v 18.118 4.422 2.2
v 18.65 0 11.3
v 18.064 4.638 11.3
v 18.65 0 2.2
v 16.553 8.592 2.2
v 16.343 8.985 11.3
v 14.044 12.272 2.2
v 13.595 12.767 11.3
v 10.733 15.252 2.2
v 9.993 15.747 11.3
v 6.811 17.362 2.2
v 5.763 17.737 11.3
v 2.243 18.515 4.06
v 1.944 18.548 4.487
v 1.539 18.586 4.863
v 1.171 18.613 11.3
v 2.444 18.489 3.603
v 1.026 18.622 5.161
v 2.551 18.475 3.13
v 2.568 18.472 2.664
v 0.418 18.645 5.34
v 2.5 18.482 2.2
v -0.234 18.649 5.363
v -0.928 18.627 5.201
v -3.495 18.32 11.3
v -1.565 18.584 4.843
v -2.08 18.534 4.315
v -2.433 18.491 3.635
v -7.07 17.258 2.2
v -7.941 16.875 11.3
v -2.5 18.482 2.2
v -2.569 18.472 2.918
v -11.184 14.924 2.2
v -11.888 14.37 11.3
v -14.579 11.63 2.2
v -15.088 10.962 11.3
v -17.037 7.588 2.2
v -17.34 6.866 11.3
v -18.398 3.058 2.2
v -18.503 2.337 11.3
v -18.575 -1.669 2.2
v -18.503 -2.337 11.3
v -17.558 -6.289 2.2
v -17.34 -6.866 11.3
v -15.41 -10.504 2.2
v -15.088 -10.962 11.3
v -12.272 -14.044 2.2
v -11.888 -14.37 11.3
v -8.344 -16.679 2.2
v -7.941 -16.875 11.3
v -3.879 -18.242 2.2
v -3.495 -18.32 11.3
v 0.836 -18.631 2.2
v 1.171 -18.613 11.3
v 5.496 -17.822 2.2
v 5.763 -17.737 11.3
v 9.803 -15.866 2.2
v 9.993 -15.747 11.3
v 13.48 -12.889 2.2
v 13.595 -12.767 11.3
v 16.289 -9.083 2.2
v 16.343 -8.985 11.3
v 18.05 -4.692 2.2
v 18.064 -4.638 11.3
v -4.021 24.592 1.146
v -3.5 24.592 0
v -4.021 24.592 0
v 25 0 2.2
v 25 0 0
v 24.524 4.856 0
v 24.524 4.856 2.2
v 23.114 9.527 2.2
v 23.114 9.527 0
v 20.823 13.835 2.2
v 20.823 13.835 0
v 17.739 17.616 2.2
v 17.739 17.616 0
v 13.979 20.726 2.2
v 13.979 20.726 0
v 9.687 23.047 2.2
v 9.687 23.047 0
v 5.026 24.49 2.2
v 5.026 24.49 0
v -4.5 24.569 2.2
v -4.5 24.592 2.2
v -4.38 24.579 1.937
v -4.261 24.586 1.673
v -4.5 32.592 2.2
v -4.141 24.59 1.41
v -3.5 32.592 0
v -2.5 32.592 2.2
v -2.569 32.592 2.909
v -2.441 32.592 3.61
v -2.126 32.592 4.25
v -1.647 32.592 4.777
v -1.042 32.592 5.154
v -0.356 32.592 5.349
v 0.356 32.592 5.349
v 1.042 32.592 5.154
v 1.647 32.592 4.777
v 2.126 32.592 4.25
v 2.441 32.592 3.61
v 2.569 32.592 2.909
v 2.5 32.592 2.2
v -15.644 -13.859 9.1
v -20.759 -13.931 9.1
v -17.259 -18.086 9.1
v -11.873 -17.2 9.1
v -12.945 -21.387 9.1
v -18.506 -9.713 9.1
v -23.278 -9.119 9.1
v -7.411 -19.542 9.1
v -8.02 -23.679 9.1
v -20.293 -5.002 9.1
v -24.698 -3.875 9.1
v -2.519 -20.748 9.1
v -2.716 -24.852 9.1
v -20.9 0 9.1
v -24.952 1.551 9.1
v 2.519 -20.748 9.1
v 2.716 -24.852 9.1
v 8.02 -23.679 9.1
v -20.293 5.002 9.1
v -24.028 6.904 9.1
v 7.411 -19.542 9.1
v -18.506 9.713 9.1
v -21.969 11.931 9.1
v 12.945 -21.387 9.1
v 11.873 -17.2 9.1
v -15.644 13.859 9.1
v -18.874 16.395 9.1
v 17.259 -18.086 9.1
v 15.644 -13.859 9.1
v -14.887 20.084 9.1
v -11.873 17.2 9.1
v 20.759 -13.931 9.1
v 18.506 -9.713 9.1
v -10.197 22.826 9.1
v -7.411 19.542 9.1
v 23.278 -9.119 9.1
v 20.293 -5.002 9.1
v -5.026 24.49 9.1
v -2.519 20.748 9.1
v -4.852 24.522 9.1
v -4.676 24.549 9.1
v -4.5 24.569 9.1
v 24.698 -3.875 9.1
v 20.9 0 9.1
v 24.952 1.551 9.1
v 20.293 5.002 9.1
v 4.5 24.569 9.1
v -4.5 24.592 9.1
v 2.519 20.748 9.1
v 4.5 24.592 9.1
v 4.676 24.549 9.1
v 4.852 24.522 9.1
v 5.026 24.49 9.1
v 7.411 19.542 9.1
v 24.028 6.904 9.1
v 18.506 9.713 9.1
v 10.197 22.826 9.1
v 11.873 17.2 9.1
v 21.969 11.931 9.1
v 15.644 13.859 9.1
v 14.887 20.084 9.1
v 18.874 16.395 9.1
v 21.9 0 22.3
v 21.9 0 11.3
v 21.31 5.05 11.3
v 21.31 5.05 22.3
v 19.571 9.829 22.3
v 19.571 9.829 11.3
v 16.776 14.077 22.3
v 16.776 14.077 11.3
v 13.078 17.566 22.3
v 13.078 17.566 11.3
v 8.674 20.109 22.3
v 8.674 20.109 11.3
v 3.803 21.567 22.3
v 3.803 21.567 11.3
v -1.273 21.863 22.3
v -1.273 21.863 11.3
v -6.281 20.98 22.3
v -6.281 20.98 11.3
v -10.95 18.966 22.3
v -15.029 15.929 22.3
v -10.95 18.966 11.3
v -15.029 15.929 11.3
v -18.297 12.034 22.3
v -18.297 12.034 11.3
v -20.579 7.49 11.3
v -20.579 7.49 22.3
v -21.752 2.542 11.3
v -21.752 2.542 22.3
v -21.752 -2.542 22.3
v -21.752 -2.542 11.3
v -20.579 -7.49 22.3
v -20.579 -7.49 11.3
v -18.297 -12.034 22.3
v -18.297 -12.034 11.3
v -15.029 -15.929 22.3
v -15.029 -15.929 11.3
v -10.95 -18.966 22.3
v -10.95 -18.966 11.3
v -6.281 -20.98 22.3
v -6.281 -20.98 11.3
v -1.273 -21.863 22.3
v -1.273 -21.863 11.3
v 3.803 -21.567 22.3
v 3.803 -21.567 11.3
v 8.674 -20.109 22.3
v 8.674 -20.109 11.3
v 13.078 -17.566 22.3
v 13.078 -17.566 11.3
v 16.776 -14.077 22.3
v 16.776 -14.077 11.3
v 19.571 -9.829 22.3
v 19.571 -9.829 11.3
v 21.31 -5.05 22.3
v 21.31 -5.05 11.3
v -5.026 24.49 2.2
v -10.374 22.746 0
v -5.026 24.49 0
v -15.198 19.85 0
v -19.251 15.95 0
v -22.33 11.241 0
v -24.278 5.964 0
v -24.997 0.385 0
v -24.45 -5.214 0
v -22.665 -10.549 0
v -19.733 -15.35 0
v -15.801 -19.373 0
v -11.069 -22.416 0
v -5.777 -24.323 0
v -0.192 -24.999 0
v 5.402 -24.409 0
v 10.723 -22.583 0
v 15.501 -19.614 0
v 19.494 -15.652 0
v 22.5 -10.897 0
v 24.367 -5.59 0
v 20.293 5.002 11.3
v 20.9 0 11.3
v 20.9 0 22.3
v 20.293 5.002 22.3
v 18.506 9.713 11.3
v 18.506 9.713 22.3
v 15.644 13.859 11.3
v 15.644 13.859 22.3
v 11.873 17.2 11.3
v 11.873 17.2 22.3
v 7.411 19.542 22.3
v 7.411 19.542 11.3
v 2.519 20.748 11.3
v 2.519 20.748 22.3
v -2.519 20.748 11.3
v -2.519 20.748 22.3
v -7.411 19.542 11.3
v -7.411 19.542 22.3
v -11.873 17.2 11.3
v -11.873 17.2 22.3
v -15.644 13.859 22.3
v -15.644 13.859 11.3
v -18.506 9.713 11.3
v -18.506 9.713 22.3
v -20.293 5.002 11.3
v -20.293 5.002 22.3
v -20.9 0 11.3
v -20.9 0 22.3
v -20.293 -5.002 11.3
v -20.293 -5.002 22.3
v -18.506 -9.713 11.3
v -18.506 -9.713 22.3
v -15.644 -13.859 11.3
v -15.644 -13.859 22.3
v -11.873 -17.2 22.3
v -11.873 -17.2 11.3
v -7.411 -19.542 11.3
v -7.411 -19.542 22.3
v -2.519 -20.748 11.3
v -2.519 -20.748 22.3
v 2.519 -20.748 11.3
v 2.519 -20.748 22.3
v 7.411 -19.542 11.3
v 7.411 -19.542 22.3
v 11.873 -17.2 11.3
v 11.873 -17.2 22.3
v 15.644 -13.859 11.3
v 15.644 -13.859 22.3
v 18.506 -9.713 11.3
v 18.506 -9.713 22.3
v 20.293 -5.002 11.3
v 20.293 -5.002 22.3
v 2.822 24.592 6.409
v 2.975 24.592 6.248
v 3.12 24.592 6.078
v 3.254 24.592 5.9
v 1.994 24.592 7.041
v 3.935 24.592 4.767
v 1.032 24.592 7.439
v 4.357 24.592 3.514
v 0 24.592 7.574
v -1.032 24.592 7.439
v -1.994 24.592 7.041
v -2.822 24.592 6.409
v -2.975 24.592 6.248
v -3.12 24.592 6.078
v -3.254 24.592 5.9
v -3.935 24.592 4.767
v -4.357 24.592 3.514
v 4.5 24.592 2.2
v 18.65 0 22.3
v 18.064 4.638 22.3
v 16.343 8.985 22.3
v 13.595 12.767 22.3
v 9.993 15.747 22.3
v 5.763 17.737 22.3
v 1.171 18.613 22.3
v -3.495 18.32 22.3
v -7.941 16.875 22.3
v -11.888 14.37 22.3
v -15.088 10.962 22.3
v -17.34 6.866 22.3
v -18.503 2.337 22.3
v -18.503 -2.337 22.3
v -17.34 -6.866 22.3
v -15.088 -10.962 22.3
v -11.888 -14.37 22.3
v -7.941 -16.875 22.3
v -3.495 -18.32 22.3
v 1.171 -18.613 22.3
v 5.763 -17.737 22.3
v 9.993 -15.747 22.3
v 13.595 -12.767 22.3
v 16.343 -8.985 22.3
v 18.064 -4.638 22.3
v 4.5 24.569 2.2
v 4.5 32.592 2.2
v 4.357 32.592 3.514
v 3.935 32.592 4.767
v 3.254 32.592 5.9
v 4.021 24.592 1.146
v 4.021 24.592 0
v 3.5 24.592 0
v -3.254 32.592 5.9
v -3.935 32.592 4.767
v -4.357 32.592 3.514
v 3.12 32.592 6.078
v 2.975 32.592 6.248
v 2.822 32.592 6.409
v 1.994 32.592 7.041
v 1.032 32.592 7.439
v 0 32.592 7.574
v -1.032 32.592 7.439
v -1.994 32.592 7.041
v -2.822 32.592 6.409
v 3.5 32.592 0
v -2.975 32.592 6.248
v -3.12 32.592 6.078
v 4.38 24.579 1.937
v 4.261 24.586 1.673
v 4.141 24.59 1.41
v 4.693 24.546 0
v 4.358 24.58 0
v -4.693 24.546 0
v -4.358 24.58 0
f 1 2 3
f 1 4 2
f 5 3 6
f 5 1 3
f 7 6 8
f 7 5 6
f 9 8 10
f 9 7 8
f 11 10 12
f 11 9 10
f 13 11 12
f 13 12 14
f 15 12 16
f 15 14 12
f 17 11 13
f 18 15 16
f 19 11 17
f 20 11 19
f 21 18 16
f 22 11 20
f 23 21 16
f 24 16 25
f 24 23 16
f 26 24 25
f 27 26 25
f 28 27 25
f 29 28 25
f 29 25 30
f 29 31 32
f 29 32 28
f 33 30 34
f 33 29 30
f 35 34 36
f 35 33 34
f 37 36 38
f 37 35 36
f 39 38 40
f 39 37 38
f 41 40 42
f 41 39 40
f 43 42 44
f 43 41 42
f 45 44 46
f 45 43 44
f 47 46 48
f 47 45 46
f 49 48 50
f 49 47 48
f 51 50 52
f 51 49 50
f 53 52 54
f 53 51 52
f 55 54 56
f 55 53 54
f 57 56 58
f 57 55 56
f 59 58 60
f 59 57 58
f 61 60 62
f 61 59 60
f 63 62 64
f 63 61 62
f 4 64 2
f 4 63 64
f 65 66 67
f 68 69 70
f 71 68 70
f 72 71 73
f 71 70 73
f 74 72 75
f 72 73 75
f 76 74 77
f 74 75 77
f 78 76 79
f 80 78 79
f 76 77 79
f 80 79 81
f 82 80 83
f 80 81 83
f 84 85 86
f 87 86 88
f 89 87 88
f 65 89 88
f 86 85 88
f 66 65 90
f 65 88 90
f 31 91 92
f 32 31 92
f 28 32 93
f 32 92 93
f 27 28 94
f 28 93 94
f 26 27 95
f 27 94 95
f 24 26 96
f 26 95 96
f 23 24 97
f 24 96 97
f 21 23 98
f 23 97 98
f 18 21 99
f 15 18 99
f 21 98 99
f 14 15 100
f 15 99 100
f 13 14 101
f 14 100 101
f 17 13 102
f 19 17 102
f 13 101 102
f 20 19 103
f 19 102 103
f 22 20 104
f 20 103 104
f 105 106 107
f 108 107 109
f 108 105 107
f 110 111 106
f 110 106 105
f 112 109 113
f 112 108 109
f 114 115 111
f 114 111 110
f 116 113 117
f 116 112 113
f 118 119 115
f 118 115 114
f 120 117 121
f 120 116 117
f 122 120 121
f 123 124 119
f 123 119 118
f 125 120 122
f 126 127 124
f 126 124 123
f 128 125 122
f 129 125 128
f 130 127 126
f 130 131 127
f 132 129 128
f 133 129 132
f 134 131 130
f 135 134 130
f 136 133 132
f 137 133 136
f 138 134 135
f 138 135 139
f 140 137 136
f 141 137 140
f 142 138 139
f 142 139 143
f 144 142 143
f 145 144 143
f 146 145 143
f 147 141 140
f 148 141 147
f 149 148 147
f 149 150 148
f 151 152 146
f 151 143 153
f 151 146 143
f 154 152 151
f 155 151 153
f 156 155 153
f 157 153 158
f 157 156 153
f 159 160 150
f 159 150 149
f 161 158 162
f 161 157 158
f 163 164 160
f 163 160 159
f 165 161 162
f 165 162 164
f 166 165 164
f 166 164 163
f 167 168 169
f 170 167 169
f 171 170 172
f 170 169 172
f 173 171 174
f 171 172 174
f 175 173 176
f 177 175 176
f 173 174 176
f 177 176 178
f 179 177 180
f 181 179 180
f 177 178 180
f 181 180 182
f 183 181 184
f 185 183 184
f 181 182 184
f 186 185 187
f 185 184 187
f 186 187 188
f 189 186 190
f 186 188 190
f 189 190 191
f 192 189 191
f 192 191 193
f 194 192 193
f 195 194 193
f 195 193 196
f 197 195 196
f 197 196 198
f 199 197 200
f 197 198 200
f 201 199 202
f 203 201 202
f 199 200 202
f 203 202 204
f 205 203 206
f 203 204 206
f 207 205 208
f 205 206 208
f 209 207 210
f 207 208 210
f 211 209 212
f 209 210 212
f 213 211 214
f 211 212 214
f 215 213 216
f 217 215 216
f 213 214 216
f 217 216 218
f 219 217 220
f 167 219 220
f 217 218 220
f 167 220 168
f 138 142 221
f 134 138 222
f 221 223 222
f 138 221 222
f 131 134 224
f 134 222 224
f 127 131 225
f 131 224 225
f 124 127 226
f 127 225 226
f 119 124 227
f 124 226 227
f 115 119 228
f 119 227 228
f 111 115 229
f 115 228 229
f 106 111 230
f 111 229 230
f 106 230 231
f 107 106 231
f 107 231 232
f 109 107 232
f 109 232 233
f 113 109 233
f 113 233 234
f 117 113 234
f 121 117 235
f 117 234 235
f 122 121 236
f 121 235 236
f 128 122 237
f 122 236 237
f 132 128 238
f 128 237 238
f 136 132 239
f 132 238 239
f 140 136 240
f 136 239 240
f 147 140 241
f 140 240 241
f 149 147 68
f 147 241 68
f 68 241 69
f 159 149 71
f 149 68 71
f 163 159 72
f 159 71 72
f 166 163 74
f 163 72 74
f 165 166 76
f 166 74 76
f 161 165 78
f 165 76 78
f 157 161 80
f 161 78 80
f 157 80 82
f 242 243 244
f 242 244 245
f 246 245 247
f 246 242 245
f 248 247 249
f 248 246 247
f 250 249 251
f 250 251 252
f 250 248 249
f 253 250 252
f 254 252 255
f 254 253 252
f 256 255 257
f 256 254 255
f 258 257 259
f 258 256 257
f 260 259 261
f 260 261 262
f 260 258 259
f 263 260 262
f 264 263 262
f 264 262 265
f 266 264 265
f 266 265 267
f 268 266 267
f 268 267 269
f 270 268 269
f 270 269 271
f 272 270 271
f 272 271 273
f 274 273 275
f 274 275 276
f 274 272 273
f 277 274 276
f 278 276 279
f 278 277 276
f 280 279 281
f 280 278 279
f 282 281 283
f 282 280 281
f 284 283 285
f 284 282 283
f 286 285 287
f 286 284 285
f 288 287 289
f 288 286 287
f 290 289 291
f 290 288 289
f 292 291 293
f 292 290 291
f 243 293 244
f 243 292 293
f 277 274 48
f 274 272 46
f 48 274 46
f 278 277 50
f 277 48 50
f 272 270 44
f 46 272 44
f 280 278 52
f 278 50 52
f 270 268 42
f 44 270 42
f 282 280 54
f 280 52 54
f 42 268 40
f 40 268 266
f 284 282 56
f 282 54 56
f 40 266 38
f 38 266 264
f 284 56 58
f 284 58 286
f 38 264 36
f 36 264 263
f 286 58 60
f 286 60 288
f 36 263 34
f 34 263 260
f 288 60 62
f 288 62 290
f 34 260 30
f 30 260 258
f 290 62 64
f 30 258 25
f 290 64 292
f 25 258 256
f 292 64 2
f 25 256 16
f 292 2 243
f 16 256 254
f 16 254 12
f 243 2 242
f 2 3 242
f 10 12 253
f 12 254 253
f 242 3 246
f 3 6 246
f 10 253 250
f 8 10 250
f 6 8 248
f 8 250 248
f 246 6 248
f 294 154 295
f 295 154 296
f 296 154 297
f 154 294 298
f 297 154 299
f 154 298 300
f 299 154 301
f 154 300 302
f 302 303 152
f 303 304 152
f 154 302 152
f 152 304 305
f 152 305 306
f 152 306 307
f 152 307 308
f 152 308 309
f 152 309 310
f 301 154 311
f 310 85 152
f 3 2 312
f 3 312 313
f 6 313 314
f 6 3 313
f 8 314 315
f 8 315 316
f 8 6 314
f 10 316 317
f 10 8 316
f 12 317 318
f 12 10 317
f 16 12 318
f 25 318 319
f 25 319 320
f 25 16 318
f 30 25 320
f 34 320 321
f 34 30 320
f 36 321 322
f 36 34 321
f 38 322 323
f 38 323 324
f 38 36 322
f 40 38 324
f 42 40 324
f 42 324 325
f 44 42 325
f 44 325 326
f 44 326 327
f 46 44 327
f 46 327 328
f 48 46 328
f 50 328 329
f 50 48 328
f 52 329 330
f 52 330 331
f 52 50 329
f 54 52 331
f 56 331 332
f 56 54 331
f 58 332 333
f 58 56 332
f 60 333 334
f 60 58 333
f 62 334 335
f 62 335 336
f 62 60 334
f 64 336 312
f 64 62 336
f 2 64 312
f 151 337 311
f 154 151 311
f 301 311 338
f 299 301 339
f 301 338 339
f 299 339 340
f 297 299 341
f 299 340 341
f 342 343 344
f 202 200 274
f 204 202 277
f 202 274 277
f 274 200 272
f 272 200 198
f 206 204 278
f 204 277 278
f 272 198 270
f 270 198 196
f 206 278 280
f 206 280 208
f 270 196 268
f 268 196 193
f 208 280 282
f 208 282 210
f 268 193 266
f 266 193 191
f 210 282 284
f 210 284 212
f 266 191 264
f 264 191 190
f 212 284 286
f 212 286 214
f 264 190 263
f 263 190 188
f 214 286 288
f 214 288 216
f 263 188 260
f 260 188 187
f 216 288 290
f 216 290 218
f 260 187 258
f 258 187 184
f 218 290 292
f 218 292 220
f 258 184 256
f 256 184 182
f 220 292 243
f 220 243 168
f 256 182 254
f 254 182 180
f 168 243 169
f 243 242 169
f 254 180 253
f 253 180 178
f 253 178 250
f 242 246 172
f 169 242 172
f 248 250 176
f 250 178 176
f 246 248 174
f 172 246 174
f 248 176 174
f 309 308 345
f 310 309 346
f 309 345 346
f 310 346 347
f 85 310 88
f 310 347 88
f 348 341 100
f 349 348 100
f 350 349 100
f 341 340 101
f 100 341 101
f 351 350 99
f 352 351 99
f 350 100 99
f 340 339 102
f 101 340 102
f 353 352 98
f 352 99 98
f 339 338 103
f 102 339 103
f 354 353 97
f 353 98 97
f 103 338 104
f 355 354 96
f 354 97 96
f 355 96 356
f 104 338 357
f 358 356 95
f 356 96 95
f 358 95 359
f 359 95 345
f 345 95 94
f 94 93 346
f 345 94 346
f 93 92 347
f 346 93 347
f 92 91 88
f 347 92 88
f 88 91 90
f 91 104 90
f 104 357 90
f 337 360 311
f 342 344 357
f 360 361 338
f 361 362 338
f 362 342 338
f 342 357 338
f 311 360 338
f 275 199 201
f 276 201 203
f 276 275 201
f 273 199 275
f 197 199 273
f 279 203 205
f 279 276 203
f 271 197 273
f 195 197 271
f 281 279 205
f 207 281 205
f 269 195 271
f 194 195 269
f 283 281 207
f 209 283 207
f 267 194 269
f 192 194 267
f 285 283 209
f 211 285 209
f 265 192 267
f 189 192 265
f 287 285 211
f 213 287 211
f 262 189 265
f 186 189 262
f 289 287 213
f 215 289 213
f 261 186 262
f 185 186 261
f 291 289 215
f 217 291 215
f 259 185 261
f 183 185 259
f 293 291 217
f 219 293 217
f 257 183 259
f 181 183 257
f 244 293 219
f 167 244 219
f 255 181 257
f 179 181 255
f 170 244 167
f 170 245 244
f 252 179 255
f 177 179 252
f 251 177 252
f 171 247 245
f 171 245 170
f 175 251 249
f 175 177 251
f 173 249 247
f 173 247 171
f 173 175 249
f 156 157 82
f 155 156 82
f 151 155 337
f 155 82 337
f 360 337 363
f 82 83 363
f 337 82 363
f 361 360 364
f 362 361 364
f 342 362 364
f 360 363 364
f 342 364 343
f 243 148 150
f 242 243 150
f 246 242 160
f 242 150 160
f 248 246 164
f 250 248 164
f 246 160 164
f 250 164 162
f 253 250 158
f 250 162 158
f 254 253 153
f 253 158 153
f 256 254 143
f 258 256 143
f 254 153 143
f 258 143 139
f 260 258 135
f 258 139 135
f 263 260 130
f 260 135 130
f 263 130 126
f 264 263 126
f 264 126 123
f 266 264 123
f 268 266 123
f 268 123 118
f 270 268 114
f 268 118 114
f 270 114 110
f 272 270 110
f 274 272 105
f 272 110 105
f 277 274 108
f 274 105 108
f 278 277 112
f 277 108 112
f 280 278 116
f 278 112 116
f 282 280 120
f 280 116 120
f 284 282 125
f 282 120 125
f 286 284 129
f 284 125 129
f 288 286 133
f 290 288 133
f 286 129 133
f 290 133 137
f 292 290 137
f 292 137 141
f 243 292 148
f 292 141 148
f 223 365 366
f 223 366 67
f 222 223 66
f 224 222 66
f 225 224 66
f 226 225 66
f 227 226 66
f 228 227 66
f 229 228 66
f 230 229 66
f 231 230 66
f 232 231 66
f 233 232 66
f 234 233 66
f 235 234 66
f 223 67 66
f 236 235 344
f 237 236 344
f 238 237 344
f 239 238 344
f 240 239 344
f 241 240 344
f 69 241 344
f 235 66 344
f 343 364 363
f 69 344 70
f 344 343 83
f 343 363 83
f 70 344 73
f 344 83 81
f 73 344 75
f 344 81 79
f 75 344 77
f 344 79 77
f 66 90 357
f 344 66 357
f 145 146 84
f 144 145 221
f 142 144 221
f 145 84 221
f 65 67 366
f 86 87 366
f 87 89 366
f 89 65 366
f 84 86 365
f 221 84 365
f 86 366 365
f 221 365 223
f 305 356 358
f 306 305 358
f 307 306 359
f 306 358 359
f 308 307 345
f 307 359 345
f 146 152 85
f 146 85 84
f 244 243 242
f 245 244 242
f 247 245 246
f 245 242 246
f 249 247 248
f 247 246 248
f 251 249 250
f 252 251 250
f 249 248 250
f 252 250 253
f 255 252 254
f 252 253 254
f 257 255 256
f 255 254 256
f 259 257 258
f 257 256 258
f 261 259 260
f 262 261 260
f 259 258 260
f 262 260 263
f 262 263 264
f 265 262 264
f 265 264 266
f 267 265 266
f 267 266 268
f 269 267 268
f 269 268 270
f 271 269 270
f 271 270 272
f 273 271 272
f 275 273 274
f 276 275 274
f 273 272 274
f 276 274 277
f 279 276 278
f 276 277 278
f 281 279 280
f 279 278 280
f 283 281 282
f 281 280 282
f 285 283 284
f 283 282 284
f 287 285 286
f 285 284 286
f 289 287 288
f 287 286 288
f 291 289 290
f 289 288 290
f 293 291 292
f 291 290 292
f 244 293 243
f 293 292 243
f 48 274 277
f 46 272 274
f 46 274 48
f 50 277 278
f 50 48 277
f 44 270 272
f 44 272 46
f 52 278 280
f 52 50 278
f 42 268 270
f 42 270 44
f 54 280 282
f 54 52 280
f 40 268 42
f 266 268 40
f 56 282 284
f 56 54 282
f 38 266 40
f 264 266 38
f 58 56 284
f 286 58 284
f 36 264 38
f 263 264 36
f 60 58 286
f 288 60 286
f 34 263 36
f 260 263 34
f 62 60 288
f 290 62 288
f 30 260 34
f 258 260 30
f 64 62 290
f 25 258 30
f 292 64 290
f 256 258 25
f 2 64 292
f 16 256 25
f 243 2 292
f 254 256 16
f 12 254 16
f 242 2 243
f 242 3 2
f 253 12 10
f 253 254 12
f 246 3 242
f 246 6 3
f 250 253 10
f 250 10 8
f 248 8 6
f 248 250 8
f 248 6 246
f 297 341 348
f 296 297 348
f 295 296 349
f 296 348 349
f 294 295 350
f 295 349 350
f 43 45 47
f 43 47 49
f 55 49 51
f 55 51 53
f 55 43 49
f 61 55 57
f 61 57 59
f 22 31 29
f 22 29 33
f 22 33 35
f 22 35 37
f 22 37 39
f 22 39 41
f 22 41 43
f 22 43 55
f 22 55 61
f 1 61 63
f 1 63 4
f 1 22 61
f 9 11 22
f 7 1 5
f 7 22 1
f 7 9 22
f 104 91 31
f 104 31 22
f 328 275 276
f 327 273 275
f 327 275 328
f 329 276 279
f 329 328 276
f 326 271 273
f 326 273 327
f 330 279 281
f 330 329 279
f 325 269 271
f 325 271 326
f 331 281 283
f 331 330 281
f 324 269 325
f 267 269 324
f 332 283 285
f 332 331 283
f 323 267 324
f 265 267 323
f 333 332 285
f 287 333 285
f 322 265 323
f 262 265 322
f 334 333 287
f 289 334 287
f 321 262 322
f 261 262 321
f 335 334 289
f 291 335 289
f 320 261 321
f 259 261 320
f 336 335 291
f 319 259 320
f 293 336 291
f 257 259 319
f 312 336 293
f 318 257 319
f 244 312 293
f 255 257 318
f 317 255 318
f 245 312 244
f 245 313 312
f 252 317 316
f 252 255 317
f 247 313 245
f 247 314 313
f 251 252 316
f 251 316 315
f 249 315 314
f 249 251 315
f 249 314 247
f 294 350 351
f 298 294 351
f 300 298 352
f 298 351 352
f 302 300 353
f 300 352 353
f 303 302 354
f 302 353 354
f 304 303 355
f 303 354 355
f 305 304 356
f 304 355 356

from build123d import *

# Parameters (mm, degrees)
F1_DEPTH  = 2.2
F3_DEPTH  = 8
F4_R      = 5
F5_R      = 18.65
F6_DEPTH  = 5.9
F8_DEPTH  = 8
F9_DEPTH  = 8
F11_DEPTH = 15
F12_DEPTH = 1
F13_R     = 20.9
F13_R_2   = 18.65
F14_DEPTH = 2.2
F15_R     = 21.9
F15_R_2   = 20.9
F16_DEPTH = 11
F17_DEPTH = 11


# Not quite as in the source:
# - a feature names something its author has since deleted; it is built from what else it names


with BuildPart() as f1:
    # F0 (on Top) → F1 (new body)
    with BuildSketch(Plane.XY):
        with BuildLine():
            ThreePointArc((-4.5, 24.5916652547), (-16.0078105936, -19.2028643697), (25, 0))
            ThreePointArc((25, 0), (19.2028643697, 16.0078105936), (4.5, 24.5916652547))
            ThreePointArc((4.5, 24.5916652547), (0, 25), (-4.5, 24.5916652547))
        make_face()
        with BuildLine():
            ThreePointArc((-4.5, 24.5916652547), (0, 25), (4.5, 24.5916652547))
            Line((4.5, 24.5916652547), (4.5, 32.5916652547))
            Line((4.5, 32.5916652547), (-4.5, 32.5916652547))
            Line((-4.5, 32.5916652547), (-4.5, 24.5916652547))
        make_face()
    extrude(amount=F1_DEPTH)

    # F2 (on face) → F3 (cut)
    with BuildSketch(Plane(origin=(0, 32.5916652547, 0), x_dir=(-1, 0, 0), z_dir=(0, 1, 0))):
        Polygon((-3.5, 0), (-4.5, 2.2), (-4.5, 0), align=None)
        Polygon((4.5, 0), (4.5, 2.2), (3.5, 0), align=None)
    extrude(amount=-F3_DEPTH, mode=Mode.SUBTRACT)

    # F4
    f4_edges = [f1.edges().sort_by_distance(p)[0] for p in [
        (-4.5, 24.591665, 1.1),
        (4.5, 24.591665, 1.1),
    ]]
    fillet(f4_edges, radius=F4_R)

    # F5 (on face) → F6 (join)
    with BuildSketch(Plane.XY.offset(2.2)):
        with BuildLine():
            ThreePointArc((-4.5, 24.5686468597), (-4.7640380816, 24.5361130362), (-5.025972006, 24.4895815684))
            ThreePointArc((-5.025972006, 24.4895815684), (0, -25), (5.025972006, 24.4895815684))
            ThreePointArc((5.025972006, 24.4895815684), (4.7640380816, 24.5361130362), (4.5, 24.5686468597))
            Line((4.5, 24.5686468597), (4.5, 32.5916652547))
            Line((4.5, 32.5916652547), (-4.5, 32.5916652547))
            Line((-4.5, 32.5916652547), (-4.5, 24.5686468597))
        make_face()
        Circle(F5_R, mode=Mode.SUBTRACT)
    extrude(amount=F6_DEPTH)

    # F7 (on face) → F8 (cut)
    with BuildSketch(Plane(origin=(0, 32.5916652547, 0), x_dir=(-1, 0, 0), z_dir=(0, 1, 0))):
        with BuildLine():
            Line((-4.5, 8.1), (-4.5, 2.2))
            ThreePointArc((-4.5, 2.2), (-4.1802190183, 4.1520343469), (-3.2543064721, 5.9))
            ThreePointArc((-3.2543064721, 5.9), (-3.0486330946, 6.1637320445), (-2.8216466984, 6.4093604335))
            ThreePointArc((-2.8216466984, 6.4093604335), (-1.5265807136, 7.4478771533), (0, 8.1))
            Line((0, 8.1), (-4.5, 8.1))
        make_face()
        with BuildLine():
            ThreePointArc((3.2543064721, 5.9), (4.1802190183, 4.1520343469), (4.5, 2.2))
            Line((4.5, 2.2), (4.5, 8.1))
            Line((4.5, 8.1), (0, 8.1))
            ThreePointArc((0, 8.1), (1.5265807136, 7.4478771533), (2.8216466984, 6.4093604335))
            ThreePointArc((2.8216466984, 6.4093604335), (3.0486330946, 6.1637320445), (3.2543064721, 5.9))
        make_face()
        with BuildLine():
            ThreePointArc((0, 8.1), (-1.5265807136, 7.4478771533), (-2.8216466984, 6.4093604335))
            ThreePointArc((-2.8216466984, 6.4093604335), (0, 7.5741690978), (2.8216466984, 6.4093604335))
            ThreePointArc((2.8216466984, 6.4093604335), (1.5265807136, 7.4478771533), (0, 8.1))
        make_face()
    extrude(amount=-F8_DEPTH, mode=Mode.SUBTRACT)

    # F7 (on face) → F9 (cut)
    with BuildSketch(Plane(origin=(0, 32.5916652547, 0), x_dir=(-1, 0, 0), z_dir=(0, 1, 0))):
        with BuildLine():
            Line((-4.5, 8.1), (-4.5, 2.2))
            ThreePointArc((-4.5, 2.2), (-4.1802190183, 4.1520343469), (-3.2543064721, 5.9))
            ThreePointArc((-3.2543064721, 5.9), (-3.0486330946, 6.1637320445), (-2.8216466984, 6.4093604335))
            ThreePointArc((-2.8216466984, 6.4093604335), (-1.5265807136, 7.4478771533), (0, 8.1))
            Line((0, 8.1), (-4.5, 8.1))
        make_face()
    extrude(amount=-F9_DEPTH, mode=Mode.SUBTRACT)

    # F10 (on face) → F11 (cut)
    with BuildSketch(Plane(origin=(0, 32.5916652547, 0), x_dir=(-1, 0, 0), z_dir=(0, 1, 0))):
        with BuildLine():
            ThreePointArc((2.5, 2.2), (0, 5.3741690978), (-2.5, 2.2))
            Line((-2.5, 2.2), (2.5, 2.2))
        make_face()
    extrude(amount=-F11_DEPTH, mode=Mode.SUBTRACT)

    # F12 (add): a face of the model
    f12_faces = [f1.faces().sort_by_distance(p)[0] for p in [
        (-3.7957746623, 24.5801560572, 8.1),
    ]]
    extrude(f12_faces, amount=F12_DEPTH)

    # F13 (on face) → F14 (join)
    with BuildSketch(Plane.XY.offset(9.1)):
        Circle(F13_R)
        Circle(F13_R_2, mode=Mode.SUBTRACT)
    extrude(amount=F14_DEPTH)


with BuildPart() as f16:
    # F15 (on face) → F16 (new body)
    with BuildSketch(Plane.XY.offset(11.3)):
        Circle(F15_R)
        Circle(F15_R_2, mode=Mode.SUBTRACT)
    extrude(amount=F16_DEPTH)


with BuildPart() as f17:
    # F17 (new): a face of the model
    f17_faces = [f1.part.faces().sort_by_distance(p)[0] for p in [
        (-20.3088587309, 0, 11.3),
    ]]
    extrude(f17_faces, amount=F17_DEPTH)


solid = Compound([f1.part, f16.part, f17.part])
